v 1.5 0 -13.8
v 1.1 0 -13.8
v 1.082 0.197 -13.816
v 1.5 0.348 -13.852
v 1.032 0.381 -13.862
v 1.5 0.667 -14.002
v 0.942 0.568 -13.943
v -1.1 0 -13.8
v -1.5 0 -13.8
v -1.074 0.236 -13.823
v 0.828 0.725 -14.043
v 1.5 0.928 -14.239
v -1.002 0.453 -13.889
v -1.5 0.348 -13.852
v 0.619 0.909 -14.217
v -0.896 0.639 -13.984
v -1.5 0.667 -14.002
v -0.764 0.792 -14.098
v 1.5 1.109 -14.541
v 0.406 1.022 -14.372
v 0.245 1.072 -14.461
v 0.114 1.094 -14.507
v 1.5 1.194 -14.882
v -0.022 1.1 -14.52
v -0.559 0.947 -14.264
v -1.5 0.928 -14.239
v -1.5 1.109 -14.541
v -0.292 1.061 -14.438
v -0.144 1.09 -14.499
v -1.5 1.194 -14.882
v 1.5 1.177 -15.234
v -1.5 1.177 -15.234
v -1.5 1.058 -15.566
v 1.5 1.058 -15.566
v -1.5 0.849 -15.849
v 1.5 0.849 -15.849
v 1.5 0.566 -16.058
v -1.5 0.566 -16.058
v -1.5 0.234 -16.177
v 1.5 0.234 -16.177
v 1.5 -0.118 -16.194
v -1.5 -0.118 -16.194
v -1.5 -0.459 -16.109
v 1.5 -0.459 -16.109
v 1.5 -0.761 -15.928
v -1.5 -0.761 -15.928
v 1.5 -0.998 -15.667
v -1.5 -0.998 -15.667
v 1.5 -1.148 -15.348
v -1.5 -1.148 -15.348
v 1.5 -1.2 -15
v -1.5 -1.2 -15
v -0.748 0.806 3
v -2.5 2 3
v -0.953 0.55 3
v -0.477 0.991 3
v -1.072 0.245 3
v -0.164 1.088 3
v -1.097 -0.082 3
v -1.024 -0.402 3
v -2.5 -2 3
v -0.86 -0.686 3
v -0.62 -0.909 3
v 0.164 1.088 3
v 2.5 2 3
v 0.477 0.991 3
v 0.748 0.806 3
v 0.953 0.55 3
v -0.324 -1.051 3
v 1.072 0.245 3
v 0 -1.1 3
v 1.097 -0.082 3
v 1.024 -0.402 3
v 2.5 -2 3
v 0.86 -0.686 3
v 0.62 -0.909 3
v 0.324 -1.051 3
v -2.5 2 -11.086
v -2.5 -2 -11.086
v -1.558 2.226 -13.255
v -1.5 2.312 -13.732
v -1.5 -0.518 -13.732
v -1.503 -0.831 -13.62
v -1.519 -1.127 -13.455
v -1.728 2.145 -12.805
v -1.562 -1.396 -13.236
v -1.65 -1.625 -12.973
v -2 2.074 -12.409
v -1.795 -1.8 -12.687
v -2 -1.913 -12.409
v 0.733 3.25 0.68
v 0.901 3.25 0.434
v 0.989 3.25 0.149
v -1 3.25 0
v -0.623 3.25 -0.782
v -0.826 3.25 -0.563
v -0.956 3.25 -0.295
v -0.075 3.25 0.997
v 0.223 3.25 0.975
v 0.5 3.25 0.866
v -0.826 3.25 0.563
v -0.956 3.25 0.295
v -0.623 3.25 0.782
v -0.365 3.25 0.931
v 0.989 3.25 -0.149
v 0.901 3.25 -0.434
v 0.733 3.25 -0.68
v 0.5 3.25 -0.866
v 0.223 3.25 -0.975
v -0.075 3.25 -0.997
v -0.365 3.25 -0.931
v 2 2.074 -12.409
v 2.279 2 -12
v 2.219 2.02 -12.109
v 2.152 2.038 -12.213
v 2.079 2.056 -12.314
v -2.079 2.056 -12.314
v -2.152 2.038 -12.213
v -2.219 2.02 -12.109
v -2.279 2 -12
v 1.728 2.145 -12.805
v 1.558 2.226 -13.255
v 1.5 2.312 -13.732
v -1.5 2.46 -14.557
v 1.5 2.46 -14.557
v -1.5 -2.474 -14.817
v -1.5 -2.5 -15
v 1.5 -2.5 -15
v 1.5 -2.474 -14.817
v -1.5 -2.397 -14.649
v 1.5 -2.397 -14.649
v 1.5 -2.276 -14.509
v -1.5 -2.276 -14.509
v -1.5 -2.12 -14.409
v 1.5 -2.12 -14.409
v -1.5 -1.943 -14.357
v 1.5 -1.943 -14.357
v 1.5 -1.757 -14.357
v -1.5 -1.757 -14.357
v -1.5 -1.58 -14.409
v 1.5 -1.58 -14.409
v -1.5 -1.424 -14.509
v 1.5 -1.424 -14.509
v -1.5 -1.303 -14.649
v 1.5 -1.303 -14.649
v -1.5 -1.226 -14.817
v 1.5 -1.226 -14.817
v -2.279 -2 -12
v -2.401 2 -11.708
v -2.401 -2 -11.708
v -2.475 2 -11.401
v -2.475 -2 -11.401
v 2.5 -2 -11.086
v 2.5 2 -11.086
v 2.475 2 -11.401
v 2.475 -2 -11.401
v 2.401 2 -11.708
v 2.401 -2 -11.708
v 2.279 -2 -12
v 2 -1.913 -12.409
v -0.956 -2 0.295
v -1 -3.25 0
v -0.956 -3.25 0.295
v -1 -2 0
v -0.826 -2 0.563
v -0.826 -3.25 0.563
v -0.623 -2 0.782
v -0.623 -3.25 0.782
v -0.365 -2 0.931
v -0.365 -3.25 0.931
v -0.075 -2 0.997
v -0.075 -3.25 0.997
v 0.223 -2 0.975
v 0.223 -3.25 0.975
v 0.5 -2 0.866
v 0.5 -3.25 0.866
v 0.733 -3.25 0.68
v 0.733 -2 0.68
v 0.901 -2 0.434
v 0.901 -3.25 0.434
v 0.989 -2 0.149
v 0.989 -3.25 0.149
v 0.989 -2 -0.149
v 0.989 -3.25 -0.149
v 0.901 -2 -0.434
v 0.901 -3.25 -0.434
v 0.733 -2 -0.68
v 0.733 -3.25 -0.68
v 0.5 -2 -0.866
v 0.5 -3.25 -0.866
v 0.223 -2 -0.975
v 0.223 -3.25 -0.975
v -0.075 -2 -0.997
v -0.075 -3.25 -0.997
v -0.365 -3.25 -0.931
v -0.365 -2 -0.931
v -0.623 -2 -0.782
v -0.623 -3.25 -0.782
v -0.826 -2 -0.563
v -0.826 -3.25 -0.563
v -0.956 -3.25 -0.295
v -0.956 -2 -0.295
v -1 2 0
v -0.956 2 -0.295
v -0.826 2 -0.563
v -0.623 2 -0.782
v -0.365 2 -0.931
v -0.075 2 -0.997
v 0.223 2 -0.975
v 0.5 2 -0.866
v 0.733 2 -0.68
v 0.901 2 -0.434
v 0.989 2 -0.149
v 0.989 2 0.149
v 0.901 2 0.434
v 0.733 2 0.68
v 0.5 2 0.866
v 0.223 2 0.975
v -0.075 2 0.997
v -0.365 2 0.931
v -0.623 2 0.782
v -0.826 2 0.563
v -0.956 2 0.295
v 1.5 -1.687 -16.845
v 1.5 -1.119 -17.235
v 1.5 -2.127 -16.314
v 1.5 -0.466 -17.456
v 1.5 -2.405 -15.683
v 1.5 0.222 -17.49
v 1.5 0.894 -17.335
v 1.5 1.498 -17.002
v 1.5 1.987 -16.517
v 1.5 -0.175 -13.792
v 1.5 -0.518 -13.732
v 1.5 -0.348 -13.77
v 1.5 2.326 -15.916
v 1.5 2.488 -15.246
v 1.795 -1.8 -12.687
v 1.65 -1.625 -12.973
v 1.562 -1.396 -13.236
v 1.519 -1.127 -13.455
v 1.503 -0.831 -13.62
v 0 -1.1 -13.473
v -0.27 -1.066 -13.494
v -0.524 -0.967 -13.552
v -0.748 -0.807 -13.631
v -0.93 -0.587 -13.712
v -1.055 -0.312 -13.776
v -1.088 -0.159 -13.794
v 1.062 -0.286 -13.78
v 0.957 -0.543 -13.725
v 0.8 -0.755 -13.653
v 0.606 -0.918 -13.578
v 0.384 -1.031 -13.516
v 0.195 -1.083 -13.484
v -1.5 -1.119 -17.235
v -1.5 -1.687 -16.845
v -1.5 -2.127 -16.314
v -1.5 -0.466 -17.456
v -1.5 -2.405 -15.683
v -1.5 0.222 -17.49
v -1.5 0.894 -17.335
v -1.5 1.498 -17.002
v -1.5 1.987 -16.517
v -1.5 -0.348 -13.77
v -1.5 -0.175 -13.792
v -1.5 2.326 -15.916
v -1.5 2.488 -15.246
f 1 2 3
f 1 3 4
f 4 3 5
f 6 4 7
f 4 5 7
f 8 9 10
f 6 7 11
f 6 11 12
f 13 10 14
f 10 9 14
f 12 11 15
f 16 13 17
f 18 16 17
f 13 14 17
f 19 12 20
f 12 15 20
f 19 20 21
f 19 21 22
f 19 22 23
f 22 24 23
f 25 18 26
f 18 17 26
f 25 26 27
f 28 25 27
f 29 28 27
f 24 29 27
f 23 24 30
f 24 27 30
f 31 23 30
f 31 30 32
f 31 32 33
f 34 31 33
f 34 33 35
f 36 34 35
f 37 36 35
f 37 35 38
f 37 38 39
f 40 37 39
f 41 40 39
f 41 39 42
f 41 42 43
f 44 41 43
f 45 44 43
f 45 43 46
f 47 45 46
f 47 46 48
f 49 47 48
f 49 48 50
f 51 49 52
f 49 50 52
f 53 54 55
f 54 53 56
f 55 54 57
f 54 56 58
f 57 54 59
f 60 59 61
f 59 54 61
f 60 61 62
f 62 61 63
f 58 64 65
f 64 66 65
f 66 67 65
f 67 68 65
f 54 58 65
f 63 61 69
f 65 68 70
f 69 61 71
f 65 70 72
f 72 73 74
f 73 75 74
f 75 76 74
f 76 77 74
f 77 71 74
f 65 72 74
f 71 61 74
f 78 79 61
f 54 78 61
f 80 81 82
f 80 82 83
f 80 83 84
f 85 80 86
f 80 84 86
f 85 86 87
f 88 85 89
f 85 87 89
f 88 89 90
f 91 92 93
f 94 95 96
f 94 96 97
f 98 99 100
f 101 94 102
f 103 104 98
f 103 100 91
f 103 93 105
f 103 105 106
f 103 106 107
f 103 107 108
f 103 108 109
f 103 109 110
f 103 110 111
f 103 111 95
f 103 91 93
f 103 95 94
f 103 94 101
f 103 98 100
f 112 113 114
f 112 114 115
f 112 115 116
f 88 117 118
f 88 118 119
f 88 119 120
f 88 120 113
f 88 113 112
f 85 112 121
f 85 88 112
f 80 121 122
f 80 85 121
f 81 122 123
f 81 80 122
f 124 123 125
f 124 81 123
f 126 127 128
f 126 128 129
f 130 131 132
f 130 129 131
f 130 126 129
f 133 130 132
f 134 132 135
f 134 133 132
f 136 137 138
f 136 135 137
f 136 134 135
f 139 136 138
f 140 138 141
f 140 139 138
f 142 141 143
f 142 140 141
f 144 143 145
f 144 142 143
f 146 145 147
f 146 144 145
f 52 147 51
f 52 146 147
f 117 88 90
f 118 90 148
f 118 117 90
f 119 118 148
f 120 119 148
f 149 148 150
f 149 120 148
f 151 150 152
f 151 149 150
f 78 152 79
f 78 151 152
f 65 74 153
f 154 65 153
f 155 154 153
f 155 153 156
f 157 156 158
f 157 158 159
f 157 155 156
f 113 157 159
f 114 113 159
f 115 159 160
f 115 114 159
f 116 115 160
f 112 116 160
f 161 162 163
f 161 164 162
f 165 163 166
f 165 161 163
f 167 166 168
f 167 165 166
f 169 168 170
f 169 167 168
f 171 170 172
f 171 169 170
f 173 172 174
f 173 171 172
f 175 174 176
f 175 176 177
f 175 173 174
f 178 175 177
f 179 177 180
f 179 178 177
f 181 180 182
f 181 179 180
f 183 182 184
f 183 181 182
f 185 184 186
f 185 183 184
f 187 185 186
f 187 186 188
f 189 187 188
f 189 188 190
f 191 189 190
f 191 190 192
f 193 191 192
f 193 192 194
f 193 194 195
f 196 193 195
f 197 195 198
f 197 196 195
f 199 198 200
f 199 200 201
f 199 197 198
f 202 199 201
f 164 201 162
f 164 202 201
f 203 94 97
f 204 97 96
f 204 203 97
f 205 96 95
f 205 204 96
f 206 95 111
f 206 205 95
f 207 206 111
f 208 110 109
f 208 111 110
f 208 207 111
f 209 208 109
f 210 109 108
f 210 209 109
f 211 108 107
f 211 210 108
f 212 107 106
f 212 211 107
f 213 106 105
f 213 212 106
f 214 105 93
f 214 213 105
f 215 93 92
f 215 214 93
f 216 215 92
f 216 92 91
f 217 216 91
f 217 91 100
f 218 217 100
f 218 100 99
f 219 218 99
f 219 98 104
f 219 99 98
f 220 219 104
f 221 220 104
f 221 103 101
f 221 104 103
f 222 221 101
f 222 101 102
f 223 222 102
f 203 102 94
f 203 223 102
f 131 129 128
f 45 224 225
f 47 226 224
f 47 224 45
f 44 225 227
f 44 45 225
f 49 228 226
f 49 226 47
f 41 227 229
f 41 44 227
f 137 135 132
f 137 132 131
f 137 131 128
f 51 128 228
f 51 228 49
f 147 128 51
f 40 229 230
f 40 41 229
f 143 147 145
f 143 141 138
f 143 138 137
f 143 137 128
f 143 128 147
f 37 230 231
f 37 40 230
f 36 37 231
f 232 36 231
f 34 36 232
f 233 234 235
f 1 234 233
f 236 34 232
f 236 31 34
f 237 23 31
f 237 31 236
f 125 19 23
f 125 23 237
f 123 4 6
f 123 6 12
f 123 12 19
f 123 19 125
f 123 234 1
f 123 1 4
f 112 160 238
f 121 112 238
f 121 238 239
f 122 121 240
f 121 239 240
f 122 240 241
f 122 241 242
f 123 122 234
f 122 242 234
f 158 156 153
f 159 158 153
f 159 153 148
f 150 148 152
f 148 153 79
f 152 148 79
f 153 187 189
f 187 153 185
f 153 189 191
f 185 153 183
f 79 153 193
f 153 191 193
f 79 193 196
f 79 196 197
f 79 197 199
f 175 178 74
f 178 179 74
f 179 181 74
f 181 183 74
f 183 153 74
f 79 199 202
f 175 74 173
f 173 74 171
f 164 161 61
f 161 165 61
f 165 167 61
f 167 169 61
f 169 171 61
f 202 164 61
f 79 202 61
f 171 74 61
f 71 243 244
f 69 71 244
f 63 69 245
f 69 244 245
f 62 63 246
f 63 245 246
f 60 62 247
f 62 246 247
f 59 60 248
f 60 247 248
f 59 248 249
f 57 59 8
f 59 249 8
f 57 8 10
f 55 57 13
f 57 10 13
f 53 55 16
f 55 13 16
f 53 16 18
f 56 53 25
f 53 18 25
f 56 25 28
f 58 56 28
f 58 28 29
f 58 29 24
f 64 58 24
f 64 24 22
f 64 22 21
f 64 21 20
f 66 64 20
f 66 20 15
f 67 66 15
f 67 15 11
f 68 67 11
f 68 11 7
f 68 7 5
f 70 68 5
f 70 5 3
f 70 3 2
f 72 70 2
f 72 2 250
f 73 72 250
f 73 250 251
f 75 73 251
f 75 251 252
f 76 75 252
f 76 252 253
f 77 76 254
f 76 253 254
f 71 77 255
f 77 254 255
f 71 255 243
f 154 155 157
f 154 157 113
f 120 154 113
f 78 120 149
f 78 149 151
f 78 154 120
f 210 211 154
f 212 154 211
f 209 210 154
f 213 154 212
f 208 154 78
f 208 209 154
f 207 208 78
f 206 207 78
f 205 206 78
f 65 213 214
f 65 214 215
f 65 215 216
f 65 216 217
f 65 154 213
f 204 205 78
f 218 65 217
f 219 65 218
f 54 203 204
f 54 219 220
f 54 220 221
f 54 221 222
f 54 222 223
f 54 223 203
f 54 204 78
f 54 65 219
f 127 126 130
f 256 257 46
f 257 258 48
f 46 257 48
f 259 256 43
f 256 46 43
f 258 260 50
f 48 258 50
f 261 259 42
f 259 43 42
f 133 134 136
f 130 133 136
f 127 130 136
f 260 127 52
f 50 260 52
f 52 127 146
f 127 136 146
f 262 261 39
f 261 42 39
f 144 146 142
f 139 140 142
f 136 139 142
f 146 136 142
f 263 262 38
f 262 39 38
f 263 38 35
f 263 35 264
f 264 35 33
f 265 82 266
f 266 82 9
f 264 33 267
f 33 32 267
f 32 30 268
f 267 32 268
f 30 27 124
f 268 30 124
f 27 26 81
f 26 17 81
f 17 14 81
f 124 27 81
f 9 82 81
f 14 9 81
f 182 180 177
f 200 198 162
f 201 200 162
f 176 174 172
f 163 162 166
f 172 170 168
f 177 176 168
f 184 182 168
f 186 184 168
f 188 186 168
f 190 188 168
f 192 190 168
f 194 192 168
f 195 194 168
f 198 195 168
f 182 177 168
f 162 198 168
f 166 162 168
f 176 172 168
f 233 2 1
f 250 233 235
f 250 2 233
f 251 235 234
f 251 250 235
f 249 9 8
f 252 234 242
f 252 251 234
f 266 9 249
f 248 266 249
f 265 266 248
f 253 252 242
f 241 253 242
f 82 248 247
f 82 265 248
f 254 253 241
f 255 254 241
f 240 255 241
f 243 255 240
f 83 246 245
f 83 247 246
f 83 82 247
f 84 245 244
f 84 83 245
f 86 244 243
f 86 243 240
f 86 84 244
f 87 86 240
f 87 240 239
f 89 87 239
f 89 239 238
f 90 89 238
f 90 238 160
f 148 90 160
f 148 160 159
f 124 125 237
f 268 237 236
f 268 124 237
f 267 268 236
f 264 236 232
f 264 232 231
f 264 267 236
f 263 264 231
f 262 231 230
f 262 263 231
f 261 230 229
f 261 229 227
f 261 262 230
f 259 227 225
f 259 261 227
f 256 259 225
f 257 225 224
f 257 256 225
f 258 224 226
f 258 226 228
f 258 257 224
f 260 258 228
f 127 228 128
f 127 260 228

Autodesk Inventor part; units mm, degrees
ref_plane "YZ Plane" through (0, 0, 0) normal (1, 0, 0) x (0, 1, 0)
ref_plane "XZ Plane" through (0, 0, 0) normal (0, 1, 0) x (-1, 0, 0)
ref_plane "XY Plane" through (0, 0, 0) normal (0, 0, 1) x (1, 0, 0)
sketch "スケッチ1" plane through (0, 0, 0) normal (0, 1, 0) x (-1, 0, 0)
  line L0 (2.5, 3) -> (-2.5, 3)
  line L1 (-2.5, 3) -> (-2.5, -12)
  line L2 (-2.5, -12) -> (2.5, -12)
  line L3 (2.5, -12) -> (2.5, 3)
  point P0 (0, 0)
  point P1 (0, 3)
  dimension "d0" = 5
  dimension "d15" = 15
  dimension "d46" = 3
extrude "押し出し1" add sketch "スケッチ1" along normal mid plane 4
sketch "スケッチ2" plane through (0, 0, 0) normal (0, 1, 0) x (-1, 0, 0)
  circle A0 centre (0, 0) radius 1
  dimension "d3" = 2
extrude "押し出し2" add sketch "スケッチ2" along normal mid plane 6.5
sketch "スケッチ5" plane through (-2.5, 2, 3) normal (0, 0, 1) x (1, 0, 0)
  point P0 (2.5, -2)
  point P1 (2.5, -2)
hole "加工用" [suppressed]
sketch "スケッチ8" plane through (0, 0, 0) normal (1, 0, 0) x (0, 1, 0)
  circle A0 centre (0, -15) radius 2.5
  circle A1 centre (0, -15) radius 1.2
  line L0 (-2, -12) -> (-2.4604, -14.557)
  line L1 (2, -12) -> (2.4604, -14.557)
  line L2 (-2, -12) -> (2, -12) projected
  line L3 (-2, -12) -> (2, -12) projected
  circle A2 centre (-1.85, -15) radius 0.65
  arc A3 (-2, -12) -> (0, -13.8) centre (0, -11.7889) ccw
  point P0 (0, 0)
  point P1 (1, -4)
  point P2 (-1, -4)
  point P3 (0, -12)
  point P4 (0, -12)
  point P5 (-1.2, -15)
  point P6 (-2.5, -15)
  point P7 (0, -12)
  point P8 (-1.5657, -13.051)
  dimension "d33" = 2.4
  dimension "d34" = 5
  dimension "d42" = 3
extrude "押し出し4" add sketch "スケッチ8" along normal mid plane 3 contours A0 A2 A1 A3 | A0 A3 L2 L1 | A2 picked at (-1.463, -16.0204)
fillet "フィレット1" radius 2 4 edges at (-1.5, 0, -12) (-2.5, 0, -12) (1.5, 0, -12) (2.5, 0, -12)
sketch "スケッチ6" plane through (-2.5, 2, 3) normal (0, 0, 1) x (1, 0, 0)
  point P0 (2.5, -2)
  point P1 (2.5, -2)
hole "穴3" at (0, 0, 3) direction (0, 0, -1) diameter 2.2 end up to surface
properties part number "gear_2" material "ABS プラスチック"
